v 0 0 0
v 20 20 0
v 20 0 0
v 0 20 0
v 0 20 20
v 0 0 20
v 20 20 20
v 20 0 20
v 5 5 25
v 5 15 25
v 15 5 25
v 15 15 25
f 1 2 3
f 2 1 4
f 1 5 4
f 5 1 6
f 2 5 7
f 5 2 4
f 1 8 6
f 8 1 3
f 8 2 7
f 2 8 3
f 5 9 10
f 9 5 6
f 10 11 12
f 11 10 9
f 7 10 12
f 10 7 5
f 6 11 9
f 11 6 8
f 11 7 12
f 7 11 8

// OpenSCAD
module moveX(x) { translate([x,0,0]) children();}
module moveY(y) { translate([0,y,0]) children();}
module moveZ(z) { translate([0,0,z]) children();}
module moveXY(x, y) { translate([x,y,0]) children();}

module scaleX(x) { scale([x,1,1]) children();}
module scaleY(y) { scale([1,y,1]) children();}
module scaleZ(z) { scale([1,1,z]) children();}



module rotateX(x) { rotate([x,0,0]) children();}
module rotateY(y) { rotate([0,y,0]) children();}
module rotateZ(z) { rotate([0,0,z]) children();}


epsilon = 0.005;

module torus(rOut, rIn)
{
	rotate_extrude(convexity=10)
		translate([rOut - 0.5 * (rOut - rIn), 0, 0])
		circle(d=rOut-rIn); // TODO: understand why $fn = $fn doesn't work
}

module mycube(xyz, chm = 1)
{
	x = xyz[0];
	y = xyz[1];
	z = xyz[2];
        
    // 3Cubes
    translate([chm,0,0]) cube([x - 2 * chm, y, z - chm]);
    translate([0, chm,0]) cube([x, y - 2 * chm, z - chm]);
    translate([chm, chm,0]) cube([x- 2 * chm, y - 2 * chm, z]);

    // 8 cylinders
    // 4 of the sides
    translate([chm, chm, 0]) cylinder(h = z - chm, r = chm);
    translate([chm, y - chm, 0]) cylinder(h = z - chm, r = chm);
    translate([x - chm, chm, 0]) cylinder(h = z - chm, r = chm);
    translate([x - chm, y - chm, 0]) cylinder(h = z - chm, r = chm);
    // 4 of the top
    translate([chm, chm, z - chm]) rotate([0,90,0]) cylinder(h = x - 2 * chm, r = chm);
    translate([chm, y - chm, z - chm]) rotate([0,90,0]) cylinder(h = x - 2 * chm, r = chm);
    translate([chm, chm, z - chm]) rotate([-90,0,0]) cylinder(h = y - 2 * chm, r = chm);
    translate([x - chm, chm, z - chm]) rotate([-90,0, 0]) cylinder(h = y - 2 * chm, r = chm);
    // 4 spheres
    translate([chm, chm, z - chm]) sphere(chm);
    translate([chm, y - chm, z - chm]) sphere(chm);
    translate([x - chm, chm, z - chm]) sphere(chm);
    translate([x - chm, y - chm, z - chm]) sphere(chm);


}



module _ringNoChampher(h, r, stripWidth)
{
    difference()
    {
        cylinder(h, r = r);
        translate([0,0,-epsilon/2]) cylinder(h + epsilon, r = r - stripWidth);
    }
}
module ring(h, r, stripWidth, chm= 1)
{
	if (chm == 0)
	{
		_ringNoChampher(h, r, stripWidth);
	}
	else
	{
		_ringNoChampher(h, r - chm, stripWidth - 2 * chm);
        _ringNoChampher(h/2, r, stripWidth);
		translate([0,0,chm]) _ringNoChampher(h - 2 * chm, r, stripWidth);
		translate([0,0,h - chm]) torus(r, r - 2 * chm);
		translate([0,0,h - chm]) torus(r - stripWidth + 2 * chm, r - stripWidth);
		
	}
}

module wagonWheel_outerStrip(h, r, stripWidth)
{
	ring(h, r, stripWidth);
}

module wagonWhell_inner(h, innerHoleR, innerStripW, innerBorder)
{
	chm = 1;
    difference()
    {
        union()
        {
            for (i = [0:1:5])
                rotate ([0,0, i * 60]) translate([-innerStripW/2,0,0]) mycube([innerStripW, innerBorder + chm, h]);
            ring(h, innerHoleR + innerStripW, innerStripW);
            _ringNoChampher(h, innerHoleR + innerStripW /2, innerStripW);
        }
        translate([0,0,-epsilon/2]) cylinder(h + epsilon, r = innerHoleR);
    }
}
module wagonWheel(h, r, radialStripW, innerHoleR, innerStripW)
{
	wagonWheel_outerStrip(h, r, radialStripW);
	wagonWhell_inner(h, innerHoleR, innerStripW, r - radialStripW);
}

	

module tappedHole(d, maxD = 200, alpha = 45)
{
    h = 20;
    r2 = h * tan(alpha);
    z = -(d/r2/2 * h);
    
    moveZ(z) intersection() 
    {
        cylinder(h = h, r1 = 0, r2 = r2, $fn=64);
        cylinder(h = h, r = maxD/2, $fn=64);
    }
}

//tappedHole(5,12);
//wagonWheel(5, 45, 8, 30, 5);
//mycube([40,50,20], 10);

//linear_extrude(10, $fn = 5) circle(20,$fn = 10);

module linear_extrude_polygonHelper(polygonP, z1, n1, z2, n2)
{
    polyhedronPoints = [
        for (i = [0: len(polygonP) - 1])
            let (n_m1 = ((i != 0) ? (i-1) : len(polygonP) - 1))
            let (n_p1 = (i != len(polygonP) - 1) ? (i+1) : 0)
            concat(n1 * polygonP[i] + (1-n1)/2 * polygonP[n_m1] + (1-n1)/2 *polygonP[n_p1], z1),
        for (i = [0: len(polygonP) - 1])
            let (n_m1 = ((i != 0) ? (i-1) : len(polygonP) - 1))
            let (n_p1 = (i != len(polygonP) - 1) ? (i+1) : 0)
            concat(n2 * polygonP[i] + (1-n2)/2 * polygonP[n_m1] + (1-n2)/2 *polygonP[n_p1], z2)
    ];
    polyhedronPaths = 
    [
        [ for (i = [0: len(polygonP) - 1]) i],
        [ for (i = [len(polygonP) - 1:-1:0]) i + len(polygonP)],
        for (i = [0: len(polygonP) - 1])

             let (n1 = len(polygonP) + i ) 
            let (n2 = len(polygonP) + (i + 1) % len(polygonP))
            let (n3 = (i + 1) % len(polygonP))
            let (n4 = i)
            [n1, n2, n3, n4] 
    ];    
    polyhedron(polyhedronPoints, polyhedronPaths);
    
}

module linear_extrude_polygon(polygonP, nmbr, chmH, chmX) // , center = false, convexity = 10, twist, slices, scale
{
    linear_extrude_polygonHelper(polygonP, 0, 1, nmbr - chmH, 1);
    linear_extrude_polygonHelper(polygonP, nmbr - chmH, 1, nmbr, chmX);
}
circ = 
   [
        for (i = [0: 90: 359])
            [sin(i), cos(i)]
    ];

//linear_extrude_polygon(30*circ,25, 5,0.5);
linear_extrude_polygon(20*[[0,0],[1,0],[1,1],[0,1]],25, 5,0.5);
